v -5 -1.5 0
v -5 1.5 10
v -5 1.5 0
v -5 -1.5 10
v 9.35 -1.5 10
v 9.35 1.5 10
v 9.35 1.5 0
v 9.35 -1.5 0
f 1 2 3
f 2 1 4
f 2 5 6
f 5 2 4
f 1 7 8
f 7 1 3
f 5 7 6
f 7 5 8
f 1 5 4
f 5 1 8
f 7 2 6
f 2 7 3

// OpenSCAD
// Built by bench/smallmodels/features/compiler.py from a list of features.
$fn = 64;
difference() {
  union() {
    translate([0, 0, 0]) linear_extrude(height = 10) polygon([[-9.35, -1.5], [9.35, -1.5], [9.35, 1.5], [-9.35, 1.5]]);
  }
  union() {
    translate([-10, 0, 0]) rotate([0, 0, 0]) translate([-5, -5, 0]) cube([10, 10, 10]);
    translate([20, 0, 0]) rotate([0, 0, 0]) translate([-2.5, -2.5, 0]) cube([5, 5, 10]);
  }
}
